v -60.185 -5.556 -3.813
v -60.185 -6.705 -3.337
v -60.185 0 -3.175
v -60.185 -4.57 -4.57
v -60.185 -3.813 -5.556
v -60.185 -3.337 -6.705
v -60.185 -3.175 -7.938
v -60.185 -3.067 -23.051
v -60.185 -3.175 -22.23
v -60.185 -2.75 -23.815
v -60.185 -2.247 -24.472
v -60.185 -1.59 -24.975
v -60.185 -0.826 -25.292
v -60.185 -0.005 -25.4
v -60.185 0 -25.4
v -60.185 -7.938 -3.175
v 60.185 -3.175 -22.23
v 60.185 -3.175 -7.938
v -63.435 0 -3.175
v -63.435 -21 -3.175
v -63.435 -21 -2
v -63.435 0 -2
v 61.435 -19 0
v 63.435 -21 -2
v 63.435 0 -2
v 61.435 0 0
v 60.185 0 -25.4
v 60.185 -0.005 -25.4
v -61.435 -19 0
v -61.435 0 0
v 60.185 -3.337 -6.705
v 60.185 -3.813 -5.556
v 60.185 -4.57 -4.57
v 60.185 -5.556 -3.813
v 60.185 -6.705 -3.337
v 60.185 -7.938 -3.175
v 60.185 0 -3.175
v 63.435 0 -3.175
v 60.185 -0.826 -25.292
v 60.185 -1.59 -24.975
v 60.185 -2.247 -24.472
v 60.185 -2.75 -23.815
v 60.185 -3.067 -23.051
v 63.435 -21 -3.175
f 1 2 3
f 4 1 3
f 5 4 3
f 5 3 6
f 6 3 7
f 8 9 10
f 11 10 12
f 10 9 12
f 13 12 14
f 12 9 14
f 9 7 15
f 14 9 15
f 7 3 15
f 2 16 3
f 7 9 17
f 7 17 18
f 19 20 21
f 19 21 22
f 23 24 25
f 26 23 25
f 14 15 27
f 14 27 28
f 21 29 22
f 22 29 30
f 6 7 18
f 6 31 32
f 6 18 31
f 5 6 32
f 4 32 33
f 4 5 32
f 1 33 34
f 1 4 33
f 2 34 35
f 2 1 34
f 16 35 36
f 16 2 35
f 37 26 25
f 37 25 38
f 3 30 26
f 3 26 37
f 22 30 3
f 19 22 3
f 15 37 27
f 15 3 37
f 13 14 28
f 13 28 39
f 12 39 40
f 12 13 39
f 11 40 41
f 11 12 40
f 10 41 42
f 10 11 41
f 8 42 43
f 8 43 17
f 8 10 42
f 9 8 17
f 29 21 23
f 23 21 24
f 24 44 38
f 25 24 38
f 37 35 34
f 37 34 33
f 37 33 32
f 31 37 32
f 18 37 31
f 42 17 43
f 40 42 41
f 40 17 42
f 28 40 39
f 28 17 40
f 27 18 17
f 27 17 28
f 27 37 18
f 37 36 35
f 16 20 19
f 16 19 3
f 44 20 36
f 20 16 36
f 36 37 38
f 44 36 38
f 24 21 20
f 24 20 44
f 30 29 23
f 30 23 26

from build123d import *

# Parameters (mm, degrees)
HIERRO_ANGULAR_1_X_1_X_0_125_1_DEPTH = 126.87
CROQUIS3_W                           = 3.25
CROQUIS3_H                           = 22.225
CORTAR_EXTRUIR1_DEPTH                = 10
CROQUIS4_W                           = 126.87
CROQUIS4_H                           = 4.4
CORTAR_EXTRUIR2_DEPTH                = 10
CHAFL_N1_SIZE                        = 2
CHAFL_N2_SIZE                        = 2


with BuildPart() as part:
    # Sketch1 → Hierro angular 1 X 1 X 0.125(1) (new body)
    with BuildSketch(Plane(origin=(-63.435, 0, 0), x_dir=(0, -1, 0), z_dir=(1, 0, 0))):
        with BuildLine():
            Line((0, 0), (0, 25.4))
            Line((0, 25.4), (0.00508, 25.4))
            ThreePointArc((0.00508, 25.4), (2.246551928, 24.471551928), (3.175, 22.23008))
            Line((3.175, 22.23008), (3.175, 7.9375))
            ThreePointArc((3.175, 7.9375), (4.569903955, 4.569903955), (7.9375, 3.175))
            Line((7.9375, 3.175), (22.23008, 3.175))
            ThreePointArc((22.23008, 3.175), (24.471551928, 2.246551928), (25.4, 0.00508))
            Line((25.4, 0.00508), (25.4, 0))
            Line((25.4, 0), (0, 0))
        make_face()
    extrude(amount=HIERRO_ANGULAR_1_X_1_X_0_125_1_DEPTH)

    # Croquis3 → Cortar-Extruir1 (cut)
    with BuildSketch(Plane(origin=(0, 0, 0), x_dir=(1, 0, 0), z_dir=(0, 1, 0))):
        with Locations((-61.81, 14.2875)):
            Rectangle(CROQUIS3_W, CROQUIS3_H)
        with Locations((61.81, 14.2875)):
            Rectangle(CROQUIS3_W, CROQUIS3_H)
    extrude(amount=-CORTAR_EXTRUIR1_DEPTH, mode=Mode.SUBTRACT)

    # Croquis4 → Cortar-Extruir2 (cut)
    with BuildSketch(Plane.XY):
        with Locations((0, -23.2)):
            Rectangle(CROQUIS4_W, CROQUIS4_H)
    extrude(amount=-CORTAR_EXTRUIR2_DEPTH, mode=Mode.SUBTRACT)

    # Chaflán1
    chafl_n1_edges = [part.edges().sort_by_distance(p)[0] for p in [
        (0, -21, 0),
    ]]
    chamfer(chafl_n1_edges, length=CHAFL_N1_SIZE)

    # Chaflán2
    chafl_n2_edges = [part.edges().sort_by_distance(p)[0] for p in [
        (63.435, -9.5, 0),
        (-63.435, -9.5, 0),
    ]]
    chamfer(chafl_n2_edges, length=CHAFL_N2_SIZE)


solid = part.part
